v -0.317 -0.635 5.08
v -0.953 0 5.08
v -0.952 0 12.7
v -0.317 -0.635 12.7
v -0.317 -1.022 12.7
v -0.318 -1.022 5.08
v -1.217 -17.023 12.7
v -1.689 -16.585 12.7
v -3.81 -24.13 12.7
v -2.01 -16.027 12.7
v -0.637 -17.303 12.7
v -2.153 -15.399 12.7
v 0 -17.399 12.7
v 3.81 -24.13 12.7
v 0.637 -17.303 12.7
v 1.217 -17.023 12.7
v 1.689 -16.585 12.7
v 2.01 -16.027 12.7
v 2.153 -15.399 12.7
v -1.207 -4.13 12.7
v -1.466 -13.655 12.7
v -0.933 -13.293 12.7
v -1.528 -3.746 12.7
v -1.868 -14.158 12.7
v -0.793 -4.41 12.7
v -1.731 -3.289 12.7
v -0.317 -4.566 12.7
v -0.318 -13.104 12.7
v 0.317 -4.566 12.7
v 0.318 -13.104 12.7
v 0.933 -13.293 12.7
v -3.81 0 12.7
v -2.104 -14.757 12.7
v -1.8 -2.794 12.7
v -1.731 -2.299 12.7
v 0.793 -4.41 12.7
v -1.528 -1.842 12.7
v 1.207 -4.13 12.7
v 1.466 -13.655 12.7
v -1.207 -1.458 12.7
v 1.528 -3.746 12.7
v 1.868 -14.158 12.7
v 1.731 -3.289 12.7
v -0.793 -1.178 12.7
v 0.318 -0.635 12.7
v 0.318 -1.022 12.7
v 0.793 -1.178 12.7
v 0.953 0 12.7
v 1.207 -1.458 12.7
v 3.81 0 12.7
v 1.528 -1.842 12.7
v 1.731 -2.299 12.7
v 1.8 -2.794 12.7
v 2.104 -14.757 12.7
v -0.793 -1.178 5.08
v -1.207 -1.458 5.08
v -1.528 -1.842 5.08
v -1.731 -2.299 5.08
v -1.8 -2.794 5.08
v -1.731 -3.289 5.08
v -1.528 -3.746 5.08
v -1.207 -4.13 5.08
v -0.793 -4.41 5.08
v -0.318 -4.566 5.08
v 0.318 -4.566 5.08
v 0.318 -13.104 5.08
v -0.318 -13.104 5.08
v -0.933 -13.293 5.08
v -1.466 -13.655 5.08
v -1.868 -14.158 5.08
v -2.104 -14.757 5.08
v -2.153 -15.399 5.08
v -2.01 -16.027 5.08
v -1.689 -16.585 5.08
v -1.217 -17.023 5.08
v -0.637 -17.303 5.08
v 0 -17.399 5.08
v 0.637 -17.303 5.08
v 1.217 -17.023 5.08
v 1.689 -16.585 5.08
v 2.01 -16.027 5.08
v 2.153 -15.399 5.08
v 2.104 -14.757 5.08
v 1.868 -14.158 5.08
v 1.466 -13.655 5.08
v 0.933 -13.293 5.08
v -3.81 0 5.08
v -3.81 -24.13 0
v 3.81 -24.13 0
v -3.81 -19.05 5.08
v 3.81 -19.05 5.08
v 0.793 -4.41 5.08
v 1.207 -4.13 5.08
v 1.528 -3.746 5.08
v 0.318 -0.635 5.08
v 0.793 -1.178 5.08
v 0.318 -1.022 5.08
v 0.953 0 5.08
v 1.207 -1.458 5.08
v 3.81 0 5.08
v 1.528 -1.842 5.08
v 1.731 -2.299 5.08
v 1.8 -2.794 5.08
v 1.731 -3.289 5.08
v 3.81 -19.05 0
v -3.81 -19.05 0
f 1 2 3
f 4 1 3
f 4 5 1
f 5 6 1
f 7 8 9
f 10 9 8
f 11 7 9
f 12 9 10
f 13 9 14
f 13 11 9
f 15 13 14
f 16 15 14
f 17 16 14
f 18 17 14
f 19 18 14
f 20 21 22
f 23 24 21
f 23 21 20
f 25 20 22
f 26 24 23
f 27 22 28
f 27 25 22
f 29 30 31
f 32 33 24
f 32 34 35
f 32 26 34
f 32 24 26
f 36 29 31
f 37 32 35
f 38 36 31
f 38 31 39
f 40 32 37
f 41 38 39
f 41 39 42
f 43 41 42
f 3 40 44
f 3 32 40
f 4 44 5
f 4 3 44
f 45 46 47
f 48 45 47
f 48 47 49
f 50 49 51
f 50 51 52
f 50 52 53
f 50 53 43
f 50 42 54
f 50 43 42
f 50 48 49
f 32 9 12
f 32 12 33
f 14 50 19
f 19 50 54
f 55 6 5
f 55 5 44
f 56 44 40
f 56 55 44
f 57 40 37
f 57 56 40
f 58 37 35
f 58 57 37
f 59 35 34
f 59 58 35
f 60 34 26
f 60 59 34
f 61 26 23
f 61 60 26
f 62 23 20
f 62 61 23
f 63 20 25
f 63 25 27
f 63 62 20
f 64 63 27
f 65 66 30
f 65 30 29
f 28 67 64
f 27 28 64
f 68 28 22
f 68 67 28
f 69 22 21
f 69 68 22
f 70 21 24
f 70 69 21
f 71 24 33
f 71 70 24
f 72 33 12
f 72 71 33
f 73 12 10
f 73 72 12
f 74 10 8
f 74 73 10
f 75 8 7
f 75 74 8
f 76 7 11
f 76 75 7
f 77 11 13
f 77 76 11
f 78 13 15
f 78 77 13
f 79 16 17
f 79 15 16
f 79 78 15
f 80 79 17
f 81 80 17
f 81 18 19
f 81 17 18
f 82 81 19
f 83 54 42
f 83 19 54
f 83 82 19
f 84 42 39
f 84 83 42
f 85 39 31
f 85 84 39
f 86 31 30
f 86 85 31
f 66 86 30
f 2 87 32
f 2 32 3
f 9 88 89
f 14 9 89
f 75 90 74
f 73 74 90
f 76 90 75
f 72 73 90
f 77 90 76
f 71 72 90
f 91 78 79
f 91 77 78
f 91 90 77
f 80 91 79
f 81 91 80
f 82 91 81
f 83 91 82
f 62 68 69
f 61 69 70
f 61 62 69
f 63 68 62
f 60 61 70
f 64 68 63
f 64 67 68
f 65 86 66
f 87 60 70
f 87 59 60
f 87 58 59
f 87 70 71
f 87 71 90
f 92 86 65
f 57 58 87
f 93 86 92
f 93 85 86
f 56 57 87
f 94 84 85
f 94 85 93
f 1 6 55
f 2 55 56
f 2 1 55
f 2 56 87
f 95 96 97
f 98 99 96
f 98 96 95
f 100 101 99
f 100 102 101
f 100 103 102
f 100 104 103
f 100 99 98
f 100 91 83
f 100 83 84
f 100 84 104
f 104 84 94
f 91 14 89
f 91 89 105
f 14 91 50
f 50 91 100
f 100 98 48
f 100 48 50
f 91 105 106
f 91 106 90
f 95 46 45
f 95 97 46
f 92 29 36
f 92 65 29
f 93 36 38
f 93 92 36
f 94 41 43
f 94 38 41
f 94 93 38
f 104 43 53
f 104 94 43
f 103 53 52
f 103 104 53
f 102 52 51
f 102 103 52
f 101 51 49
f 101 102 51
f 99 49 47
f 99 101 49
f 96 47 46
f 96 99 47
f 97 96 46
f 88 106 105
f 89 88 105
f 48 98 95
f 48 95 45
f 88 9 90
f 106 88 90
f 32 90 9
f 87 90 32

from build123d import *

# Parameters (mm, degrees)
F0_W     = 7.62
F0_H     = 24.13
F0_R     = 2.159
F0_R_2   = 1.8
F2_DEPTH = 12.7
F1_W     = 0.635
F1_H     = 15.24
F3_DEPTH = 19.05
F4_SIZE  = 0.635
F5_W     = 19.05
F5_H     = 5.08
F6_DEPTH = 12.7


with BuildPart() as f2:
    # F0 (on Top) → F2 (new body)
    with BuildSketch(Plane.XY):
        with Locations((0, -12.065)):
            Rectangle(F0_W, F0_H)
        with Locations((0, -15.24)):
            Circle(F0_R, mode=Mode.SUBTRACT)
        with Locations((0, -2.794)):
            Circle(F0_R_2, mode=Mode.SUBTRACT)
    extrude(amount=F2_DEPTH)

    # F1 (on Top) → F3 (cut)
    with BuildSketch(Plane.XY):
        with Locations((0, -7.62)):
            Rectangle(F1_W, F1_H)
    extrude(amount=F3_DEPTH, mode=Mode.SUBTRACT)

    # F4
    f4_edges = [f2.edges().sort_by_distance(p)[0] for p in [
        (0.3175, 0, 6.35),
        (-0.3175, 0, 6.35),
    ]]
    chamfer(f4_edges, length=F4_SIZE)

    # F5 (on Right) → F6 (cut, symmetric)
    with BuildSketch(Plane.YZ):
        with Locations((-9.525, 2.54)):
            Rectangle(F5_W, F5_H)
    extrude(amount=F6_DEPTH, both=True, mode=Mode.SUBTRACT)


solid = f2.part
